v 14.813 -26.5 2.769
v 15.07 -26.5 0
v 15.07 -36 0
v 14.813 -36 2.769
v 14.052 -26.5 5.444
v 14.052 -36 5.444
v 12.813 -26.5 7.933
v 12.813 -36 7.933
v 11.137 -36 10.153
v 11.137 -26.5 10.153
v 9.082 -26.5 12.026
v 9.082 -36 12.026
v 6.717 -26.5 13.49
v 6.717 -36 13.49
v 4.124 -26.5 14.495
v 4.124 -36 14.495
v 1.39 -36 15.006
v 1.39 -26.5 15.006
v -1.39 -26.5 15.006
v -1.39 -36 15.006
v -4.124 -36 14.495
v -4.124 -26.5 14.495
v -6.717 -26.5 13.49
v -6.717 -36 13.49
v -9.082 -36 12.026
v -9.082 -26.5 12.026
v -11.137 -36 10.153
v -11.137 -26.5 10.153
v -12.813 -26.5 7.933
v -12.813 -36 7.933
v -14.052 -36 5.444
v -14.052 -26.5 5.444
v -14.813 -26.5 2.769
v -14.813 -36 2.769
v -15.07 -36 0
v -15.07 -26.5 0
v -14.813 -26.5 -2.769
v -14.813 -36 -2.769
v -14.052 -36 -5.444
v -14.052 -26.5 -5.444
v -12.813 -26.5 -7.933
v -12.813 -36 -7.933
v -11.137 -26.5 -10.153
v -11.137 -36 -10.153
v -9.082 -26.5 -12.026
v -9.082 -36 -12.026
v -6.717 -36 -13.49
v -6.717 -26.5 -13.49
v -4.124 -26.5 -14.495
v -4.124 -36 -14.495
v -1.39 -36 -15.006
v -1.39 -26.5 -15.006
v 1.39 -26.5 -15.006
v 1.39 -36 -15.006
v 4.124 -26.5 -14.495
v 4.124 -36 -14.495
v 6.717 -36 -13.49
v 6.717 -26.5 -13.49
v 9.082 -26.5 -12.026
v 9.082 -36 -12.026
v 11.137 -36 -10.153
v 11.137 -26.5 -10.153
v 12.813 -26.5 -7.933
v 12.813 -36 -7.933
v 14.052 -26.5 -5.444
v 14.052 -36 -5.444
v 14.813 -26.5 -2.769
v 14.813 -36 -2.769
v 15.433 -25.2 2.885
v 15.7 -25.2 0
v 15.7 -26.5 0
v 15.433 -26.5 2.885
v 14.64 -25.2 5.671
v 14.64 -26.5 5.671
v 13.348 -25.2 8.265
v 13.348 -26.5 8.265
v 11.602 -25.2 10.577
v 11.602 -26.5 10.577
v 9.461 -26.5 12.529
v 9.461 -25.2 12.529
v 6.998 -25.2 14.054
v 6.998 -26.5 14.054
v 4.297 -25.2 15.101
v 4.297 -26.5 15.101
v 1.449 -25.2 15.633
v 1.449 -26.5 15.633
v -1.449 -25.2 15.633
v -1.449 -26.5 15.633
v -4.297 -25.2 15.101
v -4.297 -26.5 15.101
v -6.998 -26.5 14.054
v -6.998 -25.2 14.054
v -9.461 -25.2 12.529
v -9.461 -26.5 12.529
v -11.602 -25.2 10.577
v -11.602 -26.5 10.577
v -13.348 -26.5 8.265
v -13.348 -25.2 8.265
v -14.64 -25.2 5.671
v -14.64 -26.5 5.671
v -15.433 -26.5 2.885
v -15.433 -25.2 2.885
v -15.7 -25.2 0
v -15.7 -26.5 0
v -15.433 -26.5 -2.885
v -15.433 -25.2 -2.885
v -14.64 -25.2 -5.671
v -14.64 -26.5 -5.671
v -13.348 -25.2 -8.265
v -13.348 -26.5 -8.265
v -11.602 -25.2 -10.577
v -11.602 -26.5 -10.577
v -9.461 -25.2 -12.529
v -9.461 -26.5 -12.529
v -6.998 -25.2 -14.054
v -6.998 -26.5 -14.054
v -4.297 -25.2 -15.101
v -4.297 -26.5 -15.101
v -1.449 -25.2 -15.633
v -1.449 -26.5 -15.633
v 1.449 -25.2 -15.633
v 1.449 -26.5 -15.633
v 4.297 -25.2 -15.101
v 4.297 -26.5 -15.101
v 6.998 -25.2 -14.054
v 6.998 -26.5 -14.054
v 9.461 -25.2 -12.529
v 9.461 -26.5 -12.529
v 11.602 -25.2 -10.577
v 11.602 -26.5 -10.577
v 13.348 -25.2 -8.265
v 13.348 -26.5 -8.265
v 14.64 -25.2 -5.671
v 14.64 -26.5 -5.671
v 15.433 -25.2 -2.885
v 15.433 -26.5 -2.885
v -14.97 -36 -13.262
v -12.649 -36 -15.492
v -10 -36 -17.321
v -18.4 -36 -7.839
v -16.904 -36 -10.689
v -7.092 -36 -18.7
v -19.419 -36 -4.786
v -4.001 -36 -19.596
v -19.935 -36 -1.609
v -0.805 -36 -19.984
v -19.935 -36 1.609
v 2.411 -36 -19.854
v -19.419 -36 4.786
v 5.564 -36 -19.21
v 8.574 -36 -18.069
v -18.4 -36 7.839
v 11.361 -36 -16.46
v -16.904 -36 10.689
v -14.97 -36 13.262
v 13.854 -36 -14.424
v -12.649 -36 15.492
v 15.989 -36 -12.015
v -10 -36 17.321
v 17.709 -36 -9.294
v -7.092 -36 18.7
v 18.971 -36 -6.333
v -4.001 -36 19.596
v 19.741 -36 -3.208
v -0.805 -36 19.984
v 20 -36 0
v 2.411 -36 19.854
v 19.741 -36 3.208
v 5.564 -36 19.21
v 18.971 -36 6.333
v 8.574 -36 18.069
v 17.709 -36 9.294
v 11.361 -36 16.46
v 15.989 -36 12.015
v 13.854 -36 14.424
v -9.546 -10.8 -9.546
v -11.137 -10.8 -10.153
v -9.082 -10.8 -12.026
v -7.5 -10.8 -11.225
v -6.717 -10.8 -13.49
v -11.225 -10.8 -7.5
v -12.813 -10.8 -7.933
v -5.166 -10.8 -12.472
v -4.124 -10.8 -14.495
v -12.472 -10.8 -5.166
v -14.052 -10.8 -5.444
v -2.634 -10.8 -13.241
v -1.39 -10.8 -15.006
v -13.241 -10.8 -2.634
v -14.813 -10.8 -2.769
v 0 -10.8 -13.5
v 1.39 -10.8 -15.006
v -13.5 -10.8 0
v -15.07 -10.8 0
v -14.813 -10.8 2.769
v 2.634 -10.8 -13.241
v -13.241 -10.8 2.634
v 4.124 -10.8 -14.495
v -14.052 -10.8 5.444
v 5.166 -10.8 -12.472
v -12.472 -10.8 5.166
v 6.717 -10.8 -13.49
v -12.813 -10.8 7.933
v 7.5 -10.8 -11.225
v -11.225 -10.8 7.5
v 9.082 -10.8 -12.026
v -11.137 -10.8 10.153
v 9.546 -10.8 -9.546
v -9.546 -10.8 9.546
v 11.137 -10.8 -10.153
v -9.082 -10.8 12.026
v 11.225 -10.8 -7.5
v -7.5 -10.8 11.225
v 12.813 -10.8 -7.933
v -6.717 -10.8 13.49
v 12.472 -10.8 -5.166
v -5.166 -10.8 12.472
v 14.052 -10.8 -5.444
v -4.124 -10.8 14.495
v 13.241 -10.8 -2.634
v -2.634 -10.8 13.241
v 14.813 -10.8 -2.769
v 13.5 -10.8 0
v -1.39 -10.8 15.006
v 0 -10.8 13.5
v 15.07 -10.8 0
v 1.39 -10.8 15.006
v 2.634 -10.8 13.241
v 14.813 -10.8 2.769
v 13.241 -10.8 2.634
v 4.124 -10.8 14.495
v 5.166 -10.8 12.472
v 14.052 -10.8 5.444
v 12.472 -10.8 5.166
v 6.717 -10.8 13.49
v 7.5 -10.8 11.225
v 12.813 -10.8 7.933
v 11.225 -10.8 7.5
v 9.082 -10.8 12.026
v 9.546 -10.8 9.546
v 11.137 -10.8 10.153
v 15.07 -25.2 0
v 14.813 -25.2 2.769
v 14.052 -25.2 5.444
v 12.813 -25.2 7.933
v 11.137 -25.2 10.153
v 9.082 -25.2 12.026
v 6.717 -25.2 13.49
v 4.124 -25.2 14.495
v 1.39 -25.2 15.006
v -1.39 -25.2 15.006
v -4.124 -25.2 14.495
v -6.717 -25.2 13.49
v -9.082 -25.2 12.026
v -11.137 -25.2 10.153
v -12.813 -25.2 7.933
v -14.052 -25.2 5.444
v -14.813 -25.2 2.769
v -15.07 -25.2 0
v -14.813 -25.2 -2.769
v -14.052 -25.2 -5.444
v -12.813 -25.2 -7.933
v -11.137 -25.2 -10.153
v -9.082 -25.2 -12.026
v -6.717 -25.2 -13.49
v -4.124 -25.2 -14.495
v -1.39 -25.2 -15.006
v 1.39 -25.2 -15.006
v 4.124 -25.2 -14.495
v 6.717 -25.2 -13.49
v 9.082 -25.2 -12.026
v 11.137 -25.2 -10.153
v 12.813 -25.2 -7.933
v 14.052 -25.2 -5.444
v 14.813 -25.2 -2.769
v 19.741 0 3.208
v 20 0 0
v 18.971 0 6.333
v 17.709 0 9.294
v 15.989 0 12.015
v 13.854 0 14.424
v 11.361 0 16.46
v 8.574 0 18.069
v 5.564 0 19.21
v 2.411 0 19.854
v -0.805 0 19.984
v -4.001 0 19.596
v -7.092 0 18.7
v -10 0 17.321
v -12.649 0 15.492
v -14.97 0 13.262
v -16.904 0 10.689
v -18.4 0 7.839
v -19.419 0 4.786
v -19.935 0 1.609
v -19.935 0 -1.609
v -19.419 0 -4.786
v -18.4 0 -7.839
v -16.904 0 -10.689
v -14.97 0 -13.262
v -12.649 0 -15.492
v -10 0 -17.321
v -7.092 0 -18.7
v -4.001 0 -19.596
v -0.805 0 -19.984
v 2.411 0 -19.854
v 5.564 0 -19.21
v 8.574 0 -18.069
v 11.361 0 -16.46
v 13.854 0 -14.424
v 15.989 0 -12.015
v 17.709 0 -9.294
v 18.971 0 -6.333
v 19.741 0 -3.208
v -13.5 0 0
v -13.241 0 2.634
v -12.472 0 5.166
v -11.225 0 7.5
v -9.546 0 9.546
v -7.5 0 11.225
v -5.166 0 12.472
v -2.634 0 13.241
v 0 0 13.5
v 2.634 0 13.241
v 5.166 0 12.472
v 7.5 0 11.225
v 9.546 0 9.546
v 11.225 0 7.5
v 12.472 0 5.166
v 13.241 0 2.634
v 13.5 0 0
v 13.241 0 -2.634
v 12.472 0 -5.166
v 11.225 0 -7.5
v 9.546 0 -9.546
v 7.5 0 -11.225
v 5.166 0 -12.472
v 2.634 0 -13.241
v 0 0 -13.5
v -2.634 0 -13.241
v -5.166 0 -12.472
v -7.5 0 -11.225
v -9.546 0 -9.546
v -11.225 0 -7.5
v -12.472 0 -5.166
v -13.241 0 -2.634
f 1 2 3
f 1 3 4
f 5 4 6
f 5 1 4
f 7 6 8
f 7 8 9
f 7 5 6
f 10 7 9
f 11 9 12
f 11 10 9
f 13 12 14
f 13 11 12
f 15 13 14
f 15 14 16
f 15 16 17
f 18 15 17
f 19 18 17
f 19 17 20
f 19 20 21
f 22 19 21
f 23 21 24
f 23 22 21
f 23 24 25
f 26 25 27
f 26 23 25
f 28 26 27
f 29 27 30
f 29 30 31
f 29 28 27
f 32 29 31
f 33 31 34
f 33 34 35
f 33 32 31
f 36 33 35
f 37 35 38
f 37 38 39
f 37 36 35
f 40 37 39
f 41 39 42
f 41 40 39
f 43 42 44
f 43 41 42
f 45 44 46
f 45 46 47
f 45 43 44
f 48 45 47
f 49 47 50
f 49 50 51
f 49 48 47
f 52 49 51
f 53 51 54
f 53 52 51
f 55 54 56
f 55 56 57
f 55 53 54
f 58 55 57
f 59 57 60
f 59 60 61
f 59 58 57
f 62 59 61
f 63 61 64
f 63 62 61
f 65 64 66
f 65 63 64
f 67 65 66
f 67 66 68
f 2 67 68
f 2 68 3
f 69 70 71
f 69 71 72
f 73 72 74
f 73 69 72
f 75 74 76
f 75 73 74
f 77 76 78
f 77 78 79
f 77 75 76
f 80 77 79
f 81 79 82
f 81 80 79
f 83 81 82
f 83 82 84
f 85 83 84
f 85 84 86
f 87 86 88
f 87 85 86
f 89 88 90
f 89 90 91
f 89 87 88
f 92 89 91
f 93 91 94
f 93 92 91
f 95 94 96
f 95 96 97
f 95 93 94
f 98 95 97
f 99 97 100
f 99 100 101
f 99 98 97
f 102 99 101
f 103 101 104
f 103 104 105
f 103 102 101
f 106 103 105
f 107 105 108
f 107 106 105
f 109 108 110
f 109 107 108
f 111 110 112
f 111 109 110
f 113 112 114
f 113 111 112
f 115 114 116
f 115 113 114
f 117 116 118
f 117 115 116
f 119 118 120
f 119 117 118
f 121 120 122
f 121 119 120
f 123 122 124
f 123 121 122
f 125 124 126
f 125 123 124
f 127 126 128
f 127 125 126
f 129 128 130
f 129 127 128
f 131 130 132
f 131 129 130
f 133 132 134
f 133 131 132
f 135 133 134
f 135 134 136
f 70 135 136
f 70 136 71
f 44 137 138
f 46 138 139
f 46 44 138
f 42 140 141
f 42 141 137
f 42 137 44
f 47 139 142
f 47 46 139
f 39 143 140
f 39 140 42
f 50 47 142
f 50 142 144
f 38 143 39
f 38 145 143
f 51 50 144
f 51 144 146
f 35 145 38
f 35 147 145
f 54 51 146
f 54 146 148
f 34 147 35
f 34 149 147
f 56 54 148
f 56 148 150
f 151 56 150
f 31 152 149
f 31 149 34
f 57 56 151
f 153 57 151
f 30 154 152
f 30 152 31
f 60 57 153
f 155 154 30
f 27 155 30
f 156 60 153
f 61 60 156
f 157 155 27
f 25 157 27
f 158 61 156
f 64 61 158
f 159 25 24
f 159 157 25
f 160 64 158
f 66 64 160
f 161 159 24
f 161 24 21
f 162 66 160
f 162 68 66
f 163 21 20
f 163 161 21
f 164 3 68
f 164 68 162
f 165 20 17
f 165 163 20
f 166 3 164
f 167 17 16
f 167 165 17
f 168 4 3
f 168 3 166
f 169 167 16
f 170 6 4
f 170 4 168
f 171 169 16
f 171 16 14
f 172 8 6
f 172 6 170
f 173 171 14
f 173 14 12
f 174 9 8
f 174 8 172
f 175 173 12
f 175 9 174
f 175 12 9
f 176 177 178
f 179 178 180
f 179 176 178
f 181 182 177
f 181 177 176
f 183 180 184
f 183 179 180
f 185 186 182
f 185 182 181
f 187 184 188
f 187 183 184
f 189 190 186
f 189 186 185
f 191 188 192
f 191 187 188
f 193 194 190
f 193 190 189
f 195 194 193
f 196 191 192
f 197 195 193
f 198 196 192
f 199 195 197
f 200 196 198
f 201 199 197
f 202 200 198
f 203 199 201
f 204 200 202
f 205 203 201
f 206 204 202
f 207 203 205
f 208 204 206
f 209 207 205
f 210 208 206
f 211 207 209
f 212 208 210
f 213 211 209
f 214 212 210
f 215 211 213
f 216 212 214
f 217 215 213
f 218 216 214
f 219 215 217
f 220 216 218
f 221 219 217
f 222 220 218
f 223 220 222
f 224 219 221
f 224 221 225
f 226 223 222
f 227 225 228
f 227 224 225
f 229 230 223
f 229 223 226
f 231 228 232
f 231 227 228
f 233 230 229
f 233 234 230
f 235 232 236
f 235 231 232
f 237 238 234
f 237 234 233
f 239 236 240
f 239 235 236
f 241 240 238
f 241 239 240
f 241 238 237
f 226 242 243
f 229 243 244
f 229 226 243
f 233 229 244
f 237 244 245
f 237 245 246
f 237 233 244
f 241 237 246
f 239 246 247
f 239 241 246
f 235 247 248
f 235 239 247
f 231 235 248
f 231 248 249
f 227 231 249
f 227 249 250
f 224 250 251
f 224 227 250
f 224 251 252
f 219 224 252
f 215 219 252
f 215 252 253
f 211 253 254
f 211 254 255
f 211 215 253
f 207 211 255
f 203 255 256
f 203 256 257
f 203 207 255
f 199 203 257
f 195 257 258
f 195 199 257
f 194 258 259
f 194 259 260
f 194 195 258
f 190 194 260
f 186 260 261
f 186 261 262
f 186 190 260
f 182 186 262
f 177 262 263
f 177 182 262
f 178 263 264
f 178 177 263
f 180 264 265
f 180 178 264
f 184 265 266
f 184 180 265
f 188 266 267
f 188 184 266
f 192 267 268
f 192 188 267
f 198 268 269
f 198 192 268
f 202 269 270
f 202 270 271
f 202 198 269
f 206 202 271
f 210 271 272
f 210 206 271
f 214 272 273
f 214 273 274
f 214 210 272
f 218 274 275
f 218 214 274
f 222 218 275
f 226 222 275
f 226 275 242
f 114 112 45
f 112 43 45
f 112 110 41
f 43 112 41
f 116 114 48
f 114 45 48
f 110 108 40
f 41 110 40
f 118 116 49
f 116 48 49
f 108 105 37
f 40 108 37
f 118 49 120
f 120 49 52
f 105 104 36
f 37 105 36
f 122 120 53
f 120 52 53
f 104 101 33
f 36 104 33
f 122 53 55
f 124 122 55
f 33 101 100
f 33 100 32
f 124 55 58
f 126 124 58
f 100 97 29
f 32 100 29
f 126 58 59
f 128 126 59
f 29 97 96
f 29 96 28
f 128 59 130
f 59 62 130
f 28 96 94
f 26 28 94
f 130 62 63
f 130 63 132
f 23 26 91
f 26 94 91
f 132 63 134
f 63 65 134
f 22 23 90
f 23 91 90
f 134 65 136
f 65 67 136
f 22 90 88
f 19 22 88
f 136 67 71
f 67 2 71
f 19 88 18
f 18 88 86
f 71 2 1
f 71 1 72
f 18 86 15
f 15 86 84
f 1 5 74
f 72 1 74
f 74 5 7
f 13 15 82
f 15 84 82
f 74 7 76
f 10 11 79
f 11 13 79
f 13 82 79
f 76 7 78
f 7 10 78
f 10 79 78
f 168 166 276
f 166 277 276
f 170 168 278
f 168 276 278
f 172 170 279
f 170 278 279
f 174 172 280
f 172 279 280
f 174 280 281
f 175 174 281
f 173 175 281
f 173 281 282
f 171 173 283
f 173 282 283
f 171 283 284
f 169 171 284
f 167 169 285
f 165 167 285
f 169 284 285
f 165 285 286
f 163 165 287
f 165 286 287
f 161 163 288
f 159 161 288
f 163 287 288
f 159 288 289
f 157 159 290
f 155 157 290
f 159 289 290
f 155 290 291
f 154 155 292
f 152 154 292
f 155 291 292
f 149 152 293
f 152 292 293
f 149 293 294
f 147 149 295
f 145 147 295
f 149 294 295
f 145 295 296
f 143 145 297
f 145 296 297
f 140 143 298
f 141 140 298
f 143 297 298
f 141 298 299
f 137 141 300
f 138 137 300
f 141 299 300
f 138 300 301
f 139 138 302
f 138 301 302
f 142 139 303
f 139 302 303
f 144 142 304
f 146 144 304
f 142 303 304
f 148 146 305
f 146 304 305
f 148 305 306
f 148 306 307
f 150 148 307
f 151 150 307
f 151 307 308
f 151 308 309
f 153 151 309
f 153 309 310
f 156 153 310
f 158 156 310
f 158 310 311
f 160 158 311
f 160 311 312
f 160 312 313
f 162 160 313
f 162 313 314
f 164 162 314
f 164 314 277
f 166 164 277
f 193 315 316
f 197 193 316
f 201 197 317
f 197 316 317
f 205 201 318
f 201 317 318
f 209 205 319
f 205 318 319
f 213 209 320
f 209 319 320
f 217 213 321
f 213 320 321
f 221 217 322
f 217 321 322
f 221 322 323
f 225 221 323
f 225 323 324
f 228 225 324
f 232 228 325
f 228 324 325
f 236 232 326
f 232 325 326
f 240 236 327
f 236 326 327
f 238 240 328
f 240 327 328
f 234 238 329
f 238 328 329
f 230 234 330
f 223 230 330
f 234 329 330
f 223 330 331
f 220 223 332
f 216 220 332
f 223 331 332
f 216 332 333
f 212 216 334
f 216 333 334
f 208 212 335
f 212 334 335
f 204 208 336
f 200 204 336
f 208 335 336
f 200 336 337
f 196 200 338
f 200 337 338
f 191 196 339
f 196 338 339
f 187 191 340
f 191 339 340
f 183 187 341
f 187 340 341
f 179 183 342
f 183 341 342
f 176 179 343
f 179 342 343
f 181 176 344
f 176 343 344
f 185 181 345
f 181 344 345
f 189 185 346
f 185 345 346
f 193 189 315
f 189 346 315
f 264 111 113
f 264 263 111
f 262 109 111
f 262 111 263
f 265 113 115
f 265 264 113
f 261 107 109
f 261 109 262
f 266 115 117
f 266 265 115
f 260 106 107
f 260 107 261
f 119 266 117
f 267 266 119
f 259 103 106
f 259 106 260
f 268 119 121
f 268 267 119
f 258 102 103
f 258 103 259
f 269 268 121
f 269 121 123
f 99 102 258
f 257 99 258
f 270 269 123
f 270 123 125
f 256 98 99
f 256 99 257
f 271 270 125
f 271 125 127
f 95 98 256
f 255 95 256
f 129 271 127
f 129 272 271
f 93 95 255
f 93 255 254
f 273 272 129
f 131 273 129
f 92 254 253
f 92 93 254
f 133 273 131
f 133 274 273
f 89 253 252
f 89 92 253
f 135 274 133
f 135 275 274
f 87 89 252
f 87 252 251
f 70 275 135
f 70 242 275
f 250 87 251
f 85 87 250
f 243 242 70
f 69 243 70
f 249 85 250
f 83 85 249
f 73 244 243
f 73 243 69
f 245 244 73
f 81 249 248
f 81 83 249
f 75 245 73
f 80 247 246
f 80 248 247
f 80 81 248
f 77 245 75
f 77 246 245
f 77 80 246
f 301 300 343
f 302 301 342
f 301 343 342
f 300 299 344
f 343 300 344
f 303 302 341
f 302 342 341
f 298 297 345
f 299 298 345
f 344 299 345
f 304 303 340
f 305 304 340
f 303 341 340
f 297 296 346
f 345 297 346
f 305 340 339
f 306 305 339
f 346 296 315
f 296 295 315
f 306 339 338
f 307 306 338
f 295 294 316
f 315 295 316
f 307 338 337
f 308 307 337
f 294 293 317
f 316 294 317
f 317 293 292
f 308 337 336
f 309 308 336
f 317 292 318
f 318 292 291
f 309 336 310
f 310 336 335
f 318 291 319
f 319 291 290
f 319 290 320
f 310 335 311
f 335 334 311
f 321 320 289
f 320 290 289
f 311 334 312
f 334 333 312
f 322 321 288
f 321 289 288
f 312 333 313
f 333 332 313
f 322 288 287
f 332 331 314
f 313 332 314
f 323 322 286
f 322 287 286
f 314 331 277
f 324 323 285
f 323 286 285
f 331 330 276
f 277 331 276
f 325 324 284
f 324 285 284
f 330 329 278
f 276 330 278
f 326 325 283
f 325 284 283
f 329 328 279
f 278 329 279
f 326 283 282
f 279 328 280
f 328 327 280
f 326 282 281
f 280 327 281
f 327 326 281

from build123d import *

# Parameters (mm, degrees)
F0_R     = 20
F0_R_2   = 15.07
F1_DEPTH = 10.8
F2_R     = 13.5
F3_DEPTH = 10.8
F4_R     = 20
F4_R_2   = 15.07
F5_DEPTH = 14.4
F6_R     = 20
F6_R_2   = 15.7
F7_DEPTH = 1.3
F8_R     = 20
F8_R_2   = 15.7
F8_R_3   = 15.07
F9_DEPTH = 9.5


with BuildPart() as f1:
    # F0 (on Front) → F1 (new body)
    with BuildSketch(Plane.XZ):
        Circle(F0_R)
        Circle(F0_R_2, mode=Mode.SUBTRACT)
        Circle(F0_R_2)
    extrude(amount=F1_DEPTH)

    # F2 (on face) → F3 (cut)
    with BuildSketch(Plane(origin=(0, 0, 0), x_dir=(-1, 0, 0), z_dir=(0, 1, 0))):
        Circle(F2_R)
    extrude(amount=-F3_DEPTH, mode=Mode.SUBTRACT)

    # F4 (on face) → F5 (join)
    with BuildSketch(Plane.XZ.offset(10.8)):
        Circle(F4_R)
        Circle(F4_R_2, mode=Mode.SUBTRACT)
    extrude(amount=F5_DEPTH)

    # F6 (on face) → F7 (join)
    with BuildSketch(Plane.XZ.offset(25.2)):
        Circle(F6_R)
        Circle(F6_R_2, mode=Mode.SUBTRACT)
    extrude(amount=F7_DEPTH)

    # F8 (on face) → F9 (join)
    with BuildSketch(Plane.XZ.offset(26.5)):
        Circle(F8_R)
        Circle(F8_R_2, mode=Mode.SUBTRACT)
        Circle(F8_R_2)
        Circle(F8_R_3, mode=Mode.SUBTRACT)
    extrude(amount=F9_DEPTH)


solid = f1.part
